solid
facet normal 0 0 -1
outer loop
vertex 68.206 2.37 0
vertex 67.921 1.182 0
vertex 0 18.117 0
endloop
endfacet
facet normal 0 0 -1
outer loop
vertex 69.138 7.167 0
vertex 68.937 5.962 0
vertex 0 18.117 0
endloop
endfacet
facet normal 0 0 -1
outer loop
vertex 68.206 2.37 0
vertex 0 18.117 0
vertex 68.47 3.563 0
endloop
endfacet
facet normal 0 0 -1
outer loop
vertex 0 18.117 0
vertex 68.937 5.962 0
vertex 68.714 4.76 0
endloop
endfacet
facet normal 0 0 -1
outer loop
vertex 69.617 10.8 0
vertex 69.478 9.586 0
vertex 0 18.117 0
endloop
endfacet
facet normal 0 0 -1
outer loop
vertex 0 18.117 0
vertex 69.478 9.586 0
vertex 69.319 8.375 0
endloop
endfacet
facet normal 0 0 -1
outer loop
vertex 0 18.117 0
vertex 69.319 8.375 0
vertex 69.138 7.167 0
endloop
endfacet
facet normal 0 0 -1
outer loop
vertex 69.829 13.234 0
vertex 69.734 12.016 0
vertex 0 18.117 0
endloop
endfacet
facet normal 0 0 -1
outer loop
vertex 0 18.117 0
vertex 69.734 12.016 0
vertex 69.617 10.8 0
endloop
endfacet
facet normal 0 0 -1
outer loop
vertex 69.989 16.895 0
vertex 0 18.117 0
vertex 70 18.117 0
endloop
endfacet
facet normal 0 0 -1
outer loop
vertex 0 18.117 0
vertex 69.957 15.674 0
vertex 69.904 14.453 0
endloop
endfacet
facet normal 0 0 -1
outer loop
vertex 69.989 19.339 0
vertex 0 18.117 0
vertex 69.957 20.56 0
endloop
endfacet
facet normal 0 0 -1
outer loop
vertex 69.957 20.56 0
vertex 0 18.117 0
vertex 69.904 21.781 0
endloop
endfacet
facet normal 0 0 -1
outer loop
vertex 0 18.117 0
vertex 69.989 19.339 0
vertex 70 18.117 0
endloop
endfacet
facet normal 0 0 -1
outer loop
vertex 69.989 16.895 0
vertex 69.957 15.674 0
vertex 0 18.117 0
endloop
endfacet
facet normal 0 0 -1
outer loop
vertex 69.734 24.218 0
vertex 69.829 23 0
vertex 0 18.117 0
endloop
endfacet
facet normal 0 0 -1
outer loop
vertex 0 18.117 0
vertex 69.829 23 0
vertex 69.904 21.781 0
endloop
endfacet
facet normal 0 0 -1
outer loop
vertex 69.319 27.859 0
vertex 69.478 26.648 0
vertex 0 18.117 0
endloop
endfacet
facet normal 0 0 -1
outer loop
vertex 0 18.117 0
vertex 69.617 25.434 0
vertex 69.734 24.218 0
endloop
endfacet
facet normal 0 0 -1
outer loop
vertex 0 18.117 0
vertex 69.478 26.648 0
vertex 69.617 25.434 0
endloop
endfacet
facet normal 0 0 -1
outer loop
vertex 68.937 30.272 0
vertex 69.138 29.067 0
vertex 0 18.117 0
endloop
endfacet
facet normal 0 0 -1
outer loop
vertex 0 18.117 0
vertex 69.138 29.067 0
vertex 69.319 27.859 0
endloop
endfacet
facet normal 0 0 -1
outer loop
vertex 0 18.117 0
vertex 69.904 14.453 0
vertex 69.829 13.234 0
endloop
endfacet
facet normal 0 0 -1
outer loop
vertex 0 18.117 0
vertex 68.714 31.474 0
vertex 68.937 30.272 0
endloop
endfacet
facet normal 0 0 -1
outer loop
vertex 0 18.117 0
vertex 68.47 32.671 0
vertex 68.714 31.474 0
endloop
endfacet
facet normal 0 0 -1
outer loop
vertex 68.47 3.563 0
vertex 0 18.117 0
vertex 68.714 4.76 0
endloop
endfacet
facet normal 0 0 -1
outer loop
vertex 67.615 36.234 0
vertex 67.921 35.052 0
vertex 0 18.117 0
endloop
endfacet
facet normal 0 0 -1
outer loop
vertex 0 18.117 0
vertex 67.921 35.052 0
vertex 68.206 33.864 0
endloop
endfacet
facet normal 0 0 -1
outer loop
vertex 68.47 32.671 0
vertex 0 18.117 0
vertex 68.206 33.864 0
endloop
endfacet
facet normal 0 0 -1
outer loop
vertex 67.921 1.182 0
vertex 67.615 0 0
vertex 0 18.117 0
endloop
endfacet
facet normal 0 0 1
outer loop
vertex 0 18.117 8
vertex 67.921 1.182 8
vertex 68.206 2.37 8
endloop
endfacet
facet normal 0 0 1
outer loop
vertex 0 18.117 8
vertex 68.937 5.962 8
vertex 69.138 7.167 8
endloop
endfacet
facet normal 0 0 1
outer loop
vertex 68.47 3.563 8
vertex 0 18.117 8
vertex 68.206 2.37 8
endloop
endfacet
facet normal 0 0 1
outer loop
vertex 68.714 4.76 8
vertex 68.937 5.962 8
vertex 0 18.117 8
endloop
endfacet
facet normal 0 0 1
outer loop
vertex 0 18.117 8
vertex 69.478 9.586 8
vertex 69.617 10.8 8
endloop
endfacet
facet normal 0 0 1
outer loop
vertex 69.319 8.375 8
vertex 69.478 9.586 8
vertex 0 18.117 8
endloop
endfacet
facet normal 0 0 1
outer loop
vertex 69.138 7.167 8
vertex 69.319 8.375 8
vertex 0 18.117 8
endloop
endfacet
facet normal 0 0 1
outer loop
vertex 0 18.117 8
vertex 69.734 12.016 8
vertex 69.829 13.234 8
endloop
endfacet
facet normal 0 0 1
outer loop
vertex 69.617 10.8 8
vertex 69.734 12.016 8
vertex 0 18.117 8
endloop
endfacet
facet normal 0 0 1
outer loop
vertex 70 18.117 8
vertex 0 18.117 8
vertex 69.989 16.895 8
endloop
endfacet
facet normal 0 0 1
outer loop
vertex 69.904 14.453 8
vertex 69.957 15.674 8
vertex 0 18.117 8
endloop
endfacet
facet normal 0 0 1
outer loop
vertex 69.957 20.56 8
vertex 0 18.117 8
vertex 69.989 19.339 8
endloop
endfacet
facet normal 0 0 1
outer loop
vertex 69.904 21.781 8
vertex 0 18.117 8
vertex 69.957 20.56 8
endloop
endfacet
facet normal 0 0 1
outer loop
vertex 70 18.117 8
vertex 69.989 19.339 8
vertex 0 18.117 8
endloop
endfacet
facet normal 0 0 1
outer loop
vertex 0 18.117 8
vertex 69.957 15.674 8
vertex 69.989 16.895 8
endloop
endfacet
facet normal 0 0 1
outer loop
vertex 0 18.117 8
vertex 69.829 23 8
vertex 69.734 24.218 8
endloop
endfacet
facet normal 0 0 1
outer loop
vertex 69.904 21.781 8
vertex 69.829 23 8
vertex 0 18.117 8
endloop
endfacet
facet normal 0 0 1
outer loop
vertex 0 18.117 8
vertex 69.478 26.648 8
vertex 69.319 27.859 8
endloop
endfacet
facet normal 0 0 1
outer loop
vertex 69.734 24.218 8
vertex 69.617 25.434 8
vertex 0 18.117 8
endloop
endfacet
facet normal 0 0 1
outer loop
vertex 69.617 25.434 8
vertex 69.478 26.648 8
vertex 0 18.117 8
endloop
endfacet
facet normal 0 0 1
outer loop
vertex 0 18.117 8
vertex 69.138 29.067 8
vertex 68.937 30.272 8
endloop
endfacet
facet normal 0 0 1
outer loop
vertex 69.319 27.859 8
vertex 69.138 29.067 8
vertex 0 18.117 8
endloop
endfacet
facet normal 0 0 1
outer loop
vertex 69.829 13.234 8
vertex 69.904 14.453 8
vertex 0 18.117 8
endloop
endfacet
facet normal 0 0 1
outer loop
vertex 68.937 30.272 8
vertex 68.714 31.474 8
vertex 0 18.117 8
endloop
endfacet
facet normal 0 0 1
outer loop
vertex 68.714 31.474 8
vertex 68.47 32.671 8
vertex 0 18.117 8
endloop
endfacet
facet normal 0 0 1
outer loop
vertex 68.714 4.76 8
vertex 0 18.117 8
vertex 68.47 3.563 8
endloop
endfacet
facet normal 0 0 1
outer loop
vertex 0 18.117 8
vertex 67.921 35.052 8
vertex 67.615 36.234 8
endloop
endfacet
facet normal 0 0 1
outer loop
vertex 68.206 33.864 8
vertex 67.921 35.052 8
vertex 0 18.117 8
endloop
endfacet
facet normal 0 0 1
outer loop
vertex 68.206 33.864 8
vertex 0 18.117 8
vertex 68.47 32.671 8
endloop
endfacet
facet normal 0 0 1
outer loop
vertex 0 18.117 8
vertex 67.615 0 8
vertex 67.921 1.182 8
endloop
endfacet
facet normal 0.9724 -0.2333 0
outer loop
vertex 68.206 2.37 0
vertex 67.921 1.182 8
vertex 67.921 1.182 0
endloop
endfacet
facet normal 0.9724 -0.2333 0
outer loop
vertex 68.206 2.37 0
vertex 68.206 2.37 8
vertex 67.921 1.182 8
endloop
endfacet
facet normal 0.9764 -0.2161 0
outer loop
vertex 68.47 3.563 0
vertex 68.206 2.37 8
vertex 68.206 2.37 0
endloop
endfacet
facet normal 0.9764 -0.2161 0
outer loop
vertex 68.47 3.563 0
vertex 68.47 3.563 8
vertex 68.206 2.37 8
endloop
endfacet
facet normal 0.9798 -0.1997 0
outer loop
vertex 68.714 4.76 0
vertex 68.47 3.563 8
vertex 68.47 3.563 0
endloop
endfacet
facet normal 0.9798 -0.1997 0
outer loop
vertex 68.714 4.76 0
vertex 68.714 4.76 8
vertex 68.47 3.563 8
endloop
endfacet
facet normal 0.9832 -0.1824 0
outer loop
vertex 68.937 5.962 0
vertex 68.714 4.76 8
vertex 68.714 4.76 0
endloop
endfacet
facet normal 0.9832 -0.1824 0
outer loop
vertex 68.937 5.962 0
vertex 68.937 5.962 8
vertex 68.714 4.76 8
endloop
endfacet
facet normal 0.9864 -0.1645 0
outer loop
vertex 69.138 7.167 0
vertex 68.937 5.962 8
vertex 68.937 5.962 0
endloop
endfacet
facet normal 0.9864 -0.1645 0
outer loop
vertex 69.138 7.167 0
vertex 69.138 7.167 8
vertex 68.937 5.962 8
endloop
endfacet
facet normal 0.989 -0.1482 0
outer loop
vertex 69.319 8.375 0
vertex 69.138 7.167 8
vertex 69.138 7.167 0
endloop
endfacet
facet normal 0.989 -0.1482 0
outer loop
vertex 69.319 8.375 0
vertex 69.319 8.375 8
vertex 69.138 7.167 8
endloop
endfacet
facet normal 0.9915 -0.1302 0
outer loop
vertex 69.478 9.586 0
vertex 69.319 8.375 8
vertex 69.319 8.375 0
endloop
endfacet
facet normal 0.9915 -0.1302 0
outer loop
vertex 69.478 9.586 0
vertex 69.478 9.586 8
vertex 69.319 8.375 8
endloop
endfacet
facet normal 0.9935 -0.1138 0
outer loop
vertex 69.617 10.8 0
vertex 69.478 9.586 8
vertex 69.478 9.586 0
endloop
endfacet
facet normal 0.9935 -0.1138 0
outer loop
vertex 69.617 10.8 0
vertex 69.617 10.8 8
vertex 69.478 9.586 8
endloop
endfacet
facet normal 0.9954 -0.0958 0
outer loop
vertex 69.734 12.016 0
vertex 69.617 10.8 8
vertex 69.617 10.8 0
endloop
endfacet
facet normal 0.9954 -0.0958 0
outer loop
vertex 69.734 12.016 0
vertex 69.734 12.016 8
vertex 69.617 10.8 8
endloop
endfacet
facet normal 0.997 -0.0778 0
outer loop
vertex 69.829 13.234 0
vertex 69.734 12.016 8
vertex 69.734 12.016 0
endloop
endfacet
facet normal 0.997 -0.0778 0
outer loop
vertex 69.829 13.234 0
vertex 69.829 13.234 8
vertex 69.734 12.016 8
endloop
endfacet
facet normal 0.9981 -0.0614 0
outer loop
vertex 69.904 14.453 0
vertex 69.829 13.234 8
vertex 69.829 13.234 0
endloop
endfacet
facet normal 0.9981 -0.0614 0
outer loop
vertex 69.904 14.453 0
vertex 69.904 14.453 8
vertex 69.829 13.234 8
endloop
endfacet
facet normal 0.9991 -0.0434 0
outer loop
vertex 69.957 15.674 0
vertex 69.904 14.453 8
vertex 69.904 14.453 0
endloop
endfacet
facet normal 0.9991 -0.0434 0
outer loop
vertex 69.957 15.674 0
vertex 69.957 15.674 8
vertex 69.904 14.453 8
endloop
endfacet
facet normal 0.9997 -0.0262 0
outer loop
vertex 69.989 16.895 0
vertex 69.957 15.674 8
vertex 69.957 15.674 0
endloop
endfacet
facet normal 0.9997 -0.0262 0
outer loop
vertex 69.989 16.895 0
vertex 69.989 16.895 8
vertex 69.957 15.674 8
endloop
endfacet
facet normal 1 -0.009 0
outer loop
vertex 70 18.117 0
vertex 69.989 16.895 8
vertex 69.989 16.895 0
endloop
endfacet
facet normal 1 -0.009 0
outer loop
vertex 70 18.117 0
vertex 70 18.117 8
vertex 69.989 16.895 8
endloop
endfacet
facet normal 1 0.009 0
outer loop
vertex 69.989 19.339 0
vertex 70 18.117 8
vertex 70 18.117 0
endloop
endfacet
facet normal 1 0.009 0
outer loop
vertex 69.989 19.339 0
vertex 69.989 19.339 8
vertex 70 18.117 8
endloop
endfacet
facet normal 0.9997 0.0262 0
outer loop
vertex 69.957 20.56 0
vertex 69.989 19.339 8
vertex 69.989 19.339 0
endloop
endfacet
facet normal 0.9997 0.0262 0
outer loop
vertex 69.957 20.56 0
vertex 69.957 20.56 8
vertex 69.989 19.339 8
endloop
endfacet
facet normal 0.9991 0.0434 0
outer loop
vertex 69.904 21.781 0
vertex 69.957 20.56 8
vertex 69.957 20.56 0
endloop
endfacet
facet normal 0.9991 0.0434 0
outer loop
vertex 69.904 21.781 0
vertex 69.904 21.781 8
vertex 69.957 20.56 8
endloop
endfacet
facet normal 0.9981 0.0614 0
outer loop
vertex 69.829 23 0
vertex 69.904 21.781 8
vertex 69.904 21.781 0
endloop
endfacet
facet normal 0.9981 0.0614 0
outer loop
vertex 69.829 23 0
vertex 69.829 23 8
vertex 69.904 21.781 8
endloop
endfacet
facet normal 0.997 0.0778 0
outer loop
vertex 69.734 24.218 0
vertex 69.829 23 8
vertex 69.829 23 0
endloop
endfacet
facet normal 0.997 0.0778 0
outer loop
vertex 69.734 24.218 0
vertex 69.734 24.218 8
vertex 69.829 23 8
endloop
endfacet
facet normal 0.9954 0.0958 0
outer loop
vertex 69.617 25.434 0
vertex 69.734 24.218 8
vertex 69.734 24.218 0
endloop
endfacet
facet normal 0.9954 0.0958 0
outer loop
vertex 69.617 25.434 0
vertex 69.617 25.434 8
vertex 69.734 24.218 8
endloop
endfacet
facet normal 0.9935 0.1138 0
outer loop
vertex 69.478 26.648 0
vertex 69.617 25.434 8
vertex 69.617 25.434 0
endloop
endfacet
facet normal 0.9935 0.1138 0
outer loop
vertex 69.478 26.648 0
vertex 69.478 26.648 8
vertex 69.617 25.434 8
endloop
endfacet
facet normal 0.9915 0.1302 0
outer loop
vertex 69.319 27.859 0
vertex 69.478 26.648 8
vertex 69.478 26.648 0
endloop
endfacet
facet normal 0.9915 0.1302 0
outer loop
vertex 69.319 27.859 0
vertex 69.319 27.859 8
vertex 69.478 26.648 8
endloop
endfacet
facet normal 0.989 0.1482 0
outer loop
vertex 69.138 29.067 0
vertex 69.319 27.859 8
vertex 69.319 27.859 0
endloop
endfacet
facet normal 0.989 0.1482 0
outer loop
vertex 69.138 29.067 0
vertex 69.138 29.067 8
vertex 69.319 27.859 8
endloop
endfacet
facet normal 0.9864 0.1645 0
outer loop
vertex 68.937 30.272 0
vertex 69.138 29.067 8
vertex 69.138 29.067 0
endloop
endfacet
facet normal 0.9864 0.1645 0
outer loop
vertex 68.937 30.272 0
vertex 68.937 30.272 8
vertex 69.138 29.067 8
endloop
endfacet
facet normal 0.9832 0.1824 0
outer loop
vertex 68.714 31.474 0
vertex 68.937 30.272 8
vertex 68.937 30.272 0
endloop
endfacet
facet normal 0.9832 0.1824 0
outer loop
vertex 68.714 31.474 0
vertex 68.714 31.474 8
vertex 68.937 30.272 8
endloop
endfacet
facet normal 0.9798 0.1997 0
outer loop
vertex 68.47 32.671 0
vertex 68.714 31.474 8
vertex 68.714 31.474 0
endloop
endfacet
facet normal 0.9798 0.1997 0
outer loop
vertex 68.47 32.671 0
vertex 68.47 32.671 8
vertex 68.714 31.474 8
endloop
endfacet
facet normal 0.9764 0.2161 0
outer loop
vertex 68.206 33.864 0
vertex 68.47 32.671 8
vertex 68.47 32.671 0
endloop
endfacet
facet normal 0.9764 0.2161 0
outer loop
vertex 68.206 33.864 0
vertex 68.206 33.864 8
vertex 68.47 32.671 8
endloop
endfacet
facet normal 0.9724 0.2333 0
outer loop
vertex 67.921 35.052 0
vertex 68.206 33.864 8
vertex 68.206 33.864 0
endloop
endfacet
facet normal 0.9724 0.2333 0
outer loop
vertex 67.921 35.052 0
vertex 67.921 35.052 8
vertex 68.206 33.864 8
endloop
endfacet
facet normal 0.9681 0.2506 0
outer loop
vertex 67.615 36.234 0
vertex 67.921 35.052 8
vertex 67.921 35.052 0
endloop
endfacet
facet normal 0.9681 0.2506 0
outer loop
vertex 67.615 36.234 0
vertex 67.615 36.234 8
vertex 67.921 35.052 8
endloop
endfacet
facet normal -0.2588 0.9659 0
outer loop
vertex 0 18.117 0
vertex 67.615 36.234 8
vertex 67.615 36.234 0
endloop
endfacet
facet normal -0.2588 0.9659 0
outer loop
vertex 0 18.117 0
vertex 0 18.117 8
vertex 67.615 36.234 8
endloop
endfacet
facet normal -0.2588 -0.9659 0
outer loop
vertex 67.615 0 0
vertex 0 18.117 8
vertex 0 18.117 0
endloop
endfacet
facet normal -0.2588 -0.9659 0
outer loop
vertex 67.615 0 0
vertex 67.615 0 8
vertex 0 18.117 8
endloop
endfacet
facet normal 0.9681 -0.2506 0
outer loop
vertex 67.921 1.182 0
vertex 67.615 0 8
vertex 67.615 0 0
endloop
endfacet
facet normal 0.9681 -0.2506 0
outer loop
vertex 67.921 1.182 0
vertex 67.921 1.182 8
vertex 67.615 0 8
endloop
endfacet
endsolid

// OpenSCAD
$fn = 32;

// ----------------------------------------------------------------------
// Arc profile plate: sector, 32 points
// ----------------------------------------------------------------------

// --- parameters (mm) ---
sector_angle = 30;        // sector angle, degrees
sector_r = 70;            // outer radius
arc_step = 1;             // sampling step of the arc, degrees
plate_t = 8;              // plate thickness, Z
fit_tol = 0.05;           // declared fit tolerance (prompt contract)
free_tol = 0.2;           // declared free tolerance (prompt contract)

bbox_x = 2 * sector_r * sin(sector_angle / 2);  // chord of the sector
bbox_y = sector_r;  // depth of the sector (apex to arc)

profile = [[67.615, 0], [67.921, 1.182], [68.206, 2.37], [68.47, 3.563], [68.714, 4.76], [68.937, 5.962], [69.138, 7.167], [69.319, 8.375], [69.478, 9.586], [69.617, 10.8], [69.734, 12.016], [69.829, 13.234], [69.904, 14.453], [69.957, 15.674], [69.989, 16.895], [70, 18.117], [69.989, 19.339], [69.957, 20.56], [69.904, 21.781], [69.829, 23], [69.734, 24.218], [69.617, 25.434], [69.478, 26.648], [69.319, 27.859], [69.138, 29.067], [68.937, 30.272], [68.714, 31.474], [68.47, 32.671], [68.206, 33.864], [67.921, 35.052], [67.615, 36.234], [0, 18.117]];  // primary outline, 32 points, counter clockwise

// --- the one profile operation ---
linear_extrude(height = plate_t) polygon(points = profile);
